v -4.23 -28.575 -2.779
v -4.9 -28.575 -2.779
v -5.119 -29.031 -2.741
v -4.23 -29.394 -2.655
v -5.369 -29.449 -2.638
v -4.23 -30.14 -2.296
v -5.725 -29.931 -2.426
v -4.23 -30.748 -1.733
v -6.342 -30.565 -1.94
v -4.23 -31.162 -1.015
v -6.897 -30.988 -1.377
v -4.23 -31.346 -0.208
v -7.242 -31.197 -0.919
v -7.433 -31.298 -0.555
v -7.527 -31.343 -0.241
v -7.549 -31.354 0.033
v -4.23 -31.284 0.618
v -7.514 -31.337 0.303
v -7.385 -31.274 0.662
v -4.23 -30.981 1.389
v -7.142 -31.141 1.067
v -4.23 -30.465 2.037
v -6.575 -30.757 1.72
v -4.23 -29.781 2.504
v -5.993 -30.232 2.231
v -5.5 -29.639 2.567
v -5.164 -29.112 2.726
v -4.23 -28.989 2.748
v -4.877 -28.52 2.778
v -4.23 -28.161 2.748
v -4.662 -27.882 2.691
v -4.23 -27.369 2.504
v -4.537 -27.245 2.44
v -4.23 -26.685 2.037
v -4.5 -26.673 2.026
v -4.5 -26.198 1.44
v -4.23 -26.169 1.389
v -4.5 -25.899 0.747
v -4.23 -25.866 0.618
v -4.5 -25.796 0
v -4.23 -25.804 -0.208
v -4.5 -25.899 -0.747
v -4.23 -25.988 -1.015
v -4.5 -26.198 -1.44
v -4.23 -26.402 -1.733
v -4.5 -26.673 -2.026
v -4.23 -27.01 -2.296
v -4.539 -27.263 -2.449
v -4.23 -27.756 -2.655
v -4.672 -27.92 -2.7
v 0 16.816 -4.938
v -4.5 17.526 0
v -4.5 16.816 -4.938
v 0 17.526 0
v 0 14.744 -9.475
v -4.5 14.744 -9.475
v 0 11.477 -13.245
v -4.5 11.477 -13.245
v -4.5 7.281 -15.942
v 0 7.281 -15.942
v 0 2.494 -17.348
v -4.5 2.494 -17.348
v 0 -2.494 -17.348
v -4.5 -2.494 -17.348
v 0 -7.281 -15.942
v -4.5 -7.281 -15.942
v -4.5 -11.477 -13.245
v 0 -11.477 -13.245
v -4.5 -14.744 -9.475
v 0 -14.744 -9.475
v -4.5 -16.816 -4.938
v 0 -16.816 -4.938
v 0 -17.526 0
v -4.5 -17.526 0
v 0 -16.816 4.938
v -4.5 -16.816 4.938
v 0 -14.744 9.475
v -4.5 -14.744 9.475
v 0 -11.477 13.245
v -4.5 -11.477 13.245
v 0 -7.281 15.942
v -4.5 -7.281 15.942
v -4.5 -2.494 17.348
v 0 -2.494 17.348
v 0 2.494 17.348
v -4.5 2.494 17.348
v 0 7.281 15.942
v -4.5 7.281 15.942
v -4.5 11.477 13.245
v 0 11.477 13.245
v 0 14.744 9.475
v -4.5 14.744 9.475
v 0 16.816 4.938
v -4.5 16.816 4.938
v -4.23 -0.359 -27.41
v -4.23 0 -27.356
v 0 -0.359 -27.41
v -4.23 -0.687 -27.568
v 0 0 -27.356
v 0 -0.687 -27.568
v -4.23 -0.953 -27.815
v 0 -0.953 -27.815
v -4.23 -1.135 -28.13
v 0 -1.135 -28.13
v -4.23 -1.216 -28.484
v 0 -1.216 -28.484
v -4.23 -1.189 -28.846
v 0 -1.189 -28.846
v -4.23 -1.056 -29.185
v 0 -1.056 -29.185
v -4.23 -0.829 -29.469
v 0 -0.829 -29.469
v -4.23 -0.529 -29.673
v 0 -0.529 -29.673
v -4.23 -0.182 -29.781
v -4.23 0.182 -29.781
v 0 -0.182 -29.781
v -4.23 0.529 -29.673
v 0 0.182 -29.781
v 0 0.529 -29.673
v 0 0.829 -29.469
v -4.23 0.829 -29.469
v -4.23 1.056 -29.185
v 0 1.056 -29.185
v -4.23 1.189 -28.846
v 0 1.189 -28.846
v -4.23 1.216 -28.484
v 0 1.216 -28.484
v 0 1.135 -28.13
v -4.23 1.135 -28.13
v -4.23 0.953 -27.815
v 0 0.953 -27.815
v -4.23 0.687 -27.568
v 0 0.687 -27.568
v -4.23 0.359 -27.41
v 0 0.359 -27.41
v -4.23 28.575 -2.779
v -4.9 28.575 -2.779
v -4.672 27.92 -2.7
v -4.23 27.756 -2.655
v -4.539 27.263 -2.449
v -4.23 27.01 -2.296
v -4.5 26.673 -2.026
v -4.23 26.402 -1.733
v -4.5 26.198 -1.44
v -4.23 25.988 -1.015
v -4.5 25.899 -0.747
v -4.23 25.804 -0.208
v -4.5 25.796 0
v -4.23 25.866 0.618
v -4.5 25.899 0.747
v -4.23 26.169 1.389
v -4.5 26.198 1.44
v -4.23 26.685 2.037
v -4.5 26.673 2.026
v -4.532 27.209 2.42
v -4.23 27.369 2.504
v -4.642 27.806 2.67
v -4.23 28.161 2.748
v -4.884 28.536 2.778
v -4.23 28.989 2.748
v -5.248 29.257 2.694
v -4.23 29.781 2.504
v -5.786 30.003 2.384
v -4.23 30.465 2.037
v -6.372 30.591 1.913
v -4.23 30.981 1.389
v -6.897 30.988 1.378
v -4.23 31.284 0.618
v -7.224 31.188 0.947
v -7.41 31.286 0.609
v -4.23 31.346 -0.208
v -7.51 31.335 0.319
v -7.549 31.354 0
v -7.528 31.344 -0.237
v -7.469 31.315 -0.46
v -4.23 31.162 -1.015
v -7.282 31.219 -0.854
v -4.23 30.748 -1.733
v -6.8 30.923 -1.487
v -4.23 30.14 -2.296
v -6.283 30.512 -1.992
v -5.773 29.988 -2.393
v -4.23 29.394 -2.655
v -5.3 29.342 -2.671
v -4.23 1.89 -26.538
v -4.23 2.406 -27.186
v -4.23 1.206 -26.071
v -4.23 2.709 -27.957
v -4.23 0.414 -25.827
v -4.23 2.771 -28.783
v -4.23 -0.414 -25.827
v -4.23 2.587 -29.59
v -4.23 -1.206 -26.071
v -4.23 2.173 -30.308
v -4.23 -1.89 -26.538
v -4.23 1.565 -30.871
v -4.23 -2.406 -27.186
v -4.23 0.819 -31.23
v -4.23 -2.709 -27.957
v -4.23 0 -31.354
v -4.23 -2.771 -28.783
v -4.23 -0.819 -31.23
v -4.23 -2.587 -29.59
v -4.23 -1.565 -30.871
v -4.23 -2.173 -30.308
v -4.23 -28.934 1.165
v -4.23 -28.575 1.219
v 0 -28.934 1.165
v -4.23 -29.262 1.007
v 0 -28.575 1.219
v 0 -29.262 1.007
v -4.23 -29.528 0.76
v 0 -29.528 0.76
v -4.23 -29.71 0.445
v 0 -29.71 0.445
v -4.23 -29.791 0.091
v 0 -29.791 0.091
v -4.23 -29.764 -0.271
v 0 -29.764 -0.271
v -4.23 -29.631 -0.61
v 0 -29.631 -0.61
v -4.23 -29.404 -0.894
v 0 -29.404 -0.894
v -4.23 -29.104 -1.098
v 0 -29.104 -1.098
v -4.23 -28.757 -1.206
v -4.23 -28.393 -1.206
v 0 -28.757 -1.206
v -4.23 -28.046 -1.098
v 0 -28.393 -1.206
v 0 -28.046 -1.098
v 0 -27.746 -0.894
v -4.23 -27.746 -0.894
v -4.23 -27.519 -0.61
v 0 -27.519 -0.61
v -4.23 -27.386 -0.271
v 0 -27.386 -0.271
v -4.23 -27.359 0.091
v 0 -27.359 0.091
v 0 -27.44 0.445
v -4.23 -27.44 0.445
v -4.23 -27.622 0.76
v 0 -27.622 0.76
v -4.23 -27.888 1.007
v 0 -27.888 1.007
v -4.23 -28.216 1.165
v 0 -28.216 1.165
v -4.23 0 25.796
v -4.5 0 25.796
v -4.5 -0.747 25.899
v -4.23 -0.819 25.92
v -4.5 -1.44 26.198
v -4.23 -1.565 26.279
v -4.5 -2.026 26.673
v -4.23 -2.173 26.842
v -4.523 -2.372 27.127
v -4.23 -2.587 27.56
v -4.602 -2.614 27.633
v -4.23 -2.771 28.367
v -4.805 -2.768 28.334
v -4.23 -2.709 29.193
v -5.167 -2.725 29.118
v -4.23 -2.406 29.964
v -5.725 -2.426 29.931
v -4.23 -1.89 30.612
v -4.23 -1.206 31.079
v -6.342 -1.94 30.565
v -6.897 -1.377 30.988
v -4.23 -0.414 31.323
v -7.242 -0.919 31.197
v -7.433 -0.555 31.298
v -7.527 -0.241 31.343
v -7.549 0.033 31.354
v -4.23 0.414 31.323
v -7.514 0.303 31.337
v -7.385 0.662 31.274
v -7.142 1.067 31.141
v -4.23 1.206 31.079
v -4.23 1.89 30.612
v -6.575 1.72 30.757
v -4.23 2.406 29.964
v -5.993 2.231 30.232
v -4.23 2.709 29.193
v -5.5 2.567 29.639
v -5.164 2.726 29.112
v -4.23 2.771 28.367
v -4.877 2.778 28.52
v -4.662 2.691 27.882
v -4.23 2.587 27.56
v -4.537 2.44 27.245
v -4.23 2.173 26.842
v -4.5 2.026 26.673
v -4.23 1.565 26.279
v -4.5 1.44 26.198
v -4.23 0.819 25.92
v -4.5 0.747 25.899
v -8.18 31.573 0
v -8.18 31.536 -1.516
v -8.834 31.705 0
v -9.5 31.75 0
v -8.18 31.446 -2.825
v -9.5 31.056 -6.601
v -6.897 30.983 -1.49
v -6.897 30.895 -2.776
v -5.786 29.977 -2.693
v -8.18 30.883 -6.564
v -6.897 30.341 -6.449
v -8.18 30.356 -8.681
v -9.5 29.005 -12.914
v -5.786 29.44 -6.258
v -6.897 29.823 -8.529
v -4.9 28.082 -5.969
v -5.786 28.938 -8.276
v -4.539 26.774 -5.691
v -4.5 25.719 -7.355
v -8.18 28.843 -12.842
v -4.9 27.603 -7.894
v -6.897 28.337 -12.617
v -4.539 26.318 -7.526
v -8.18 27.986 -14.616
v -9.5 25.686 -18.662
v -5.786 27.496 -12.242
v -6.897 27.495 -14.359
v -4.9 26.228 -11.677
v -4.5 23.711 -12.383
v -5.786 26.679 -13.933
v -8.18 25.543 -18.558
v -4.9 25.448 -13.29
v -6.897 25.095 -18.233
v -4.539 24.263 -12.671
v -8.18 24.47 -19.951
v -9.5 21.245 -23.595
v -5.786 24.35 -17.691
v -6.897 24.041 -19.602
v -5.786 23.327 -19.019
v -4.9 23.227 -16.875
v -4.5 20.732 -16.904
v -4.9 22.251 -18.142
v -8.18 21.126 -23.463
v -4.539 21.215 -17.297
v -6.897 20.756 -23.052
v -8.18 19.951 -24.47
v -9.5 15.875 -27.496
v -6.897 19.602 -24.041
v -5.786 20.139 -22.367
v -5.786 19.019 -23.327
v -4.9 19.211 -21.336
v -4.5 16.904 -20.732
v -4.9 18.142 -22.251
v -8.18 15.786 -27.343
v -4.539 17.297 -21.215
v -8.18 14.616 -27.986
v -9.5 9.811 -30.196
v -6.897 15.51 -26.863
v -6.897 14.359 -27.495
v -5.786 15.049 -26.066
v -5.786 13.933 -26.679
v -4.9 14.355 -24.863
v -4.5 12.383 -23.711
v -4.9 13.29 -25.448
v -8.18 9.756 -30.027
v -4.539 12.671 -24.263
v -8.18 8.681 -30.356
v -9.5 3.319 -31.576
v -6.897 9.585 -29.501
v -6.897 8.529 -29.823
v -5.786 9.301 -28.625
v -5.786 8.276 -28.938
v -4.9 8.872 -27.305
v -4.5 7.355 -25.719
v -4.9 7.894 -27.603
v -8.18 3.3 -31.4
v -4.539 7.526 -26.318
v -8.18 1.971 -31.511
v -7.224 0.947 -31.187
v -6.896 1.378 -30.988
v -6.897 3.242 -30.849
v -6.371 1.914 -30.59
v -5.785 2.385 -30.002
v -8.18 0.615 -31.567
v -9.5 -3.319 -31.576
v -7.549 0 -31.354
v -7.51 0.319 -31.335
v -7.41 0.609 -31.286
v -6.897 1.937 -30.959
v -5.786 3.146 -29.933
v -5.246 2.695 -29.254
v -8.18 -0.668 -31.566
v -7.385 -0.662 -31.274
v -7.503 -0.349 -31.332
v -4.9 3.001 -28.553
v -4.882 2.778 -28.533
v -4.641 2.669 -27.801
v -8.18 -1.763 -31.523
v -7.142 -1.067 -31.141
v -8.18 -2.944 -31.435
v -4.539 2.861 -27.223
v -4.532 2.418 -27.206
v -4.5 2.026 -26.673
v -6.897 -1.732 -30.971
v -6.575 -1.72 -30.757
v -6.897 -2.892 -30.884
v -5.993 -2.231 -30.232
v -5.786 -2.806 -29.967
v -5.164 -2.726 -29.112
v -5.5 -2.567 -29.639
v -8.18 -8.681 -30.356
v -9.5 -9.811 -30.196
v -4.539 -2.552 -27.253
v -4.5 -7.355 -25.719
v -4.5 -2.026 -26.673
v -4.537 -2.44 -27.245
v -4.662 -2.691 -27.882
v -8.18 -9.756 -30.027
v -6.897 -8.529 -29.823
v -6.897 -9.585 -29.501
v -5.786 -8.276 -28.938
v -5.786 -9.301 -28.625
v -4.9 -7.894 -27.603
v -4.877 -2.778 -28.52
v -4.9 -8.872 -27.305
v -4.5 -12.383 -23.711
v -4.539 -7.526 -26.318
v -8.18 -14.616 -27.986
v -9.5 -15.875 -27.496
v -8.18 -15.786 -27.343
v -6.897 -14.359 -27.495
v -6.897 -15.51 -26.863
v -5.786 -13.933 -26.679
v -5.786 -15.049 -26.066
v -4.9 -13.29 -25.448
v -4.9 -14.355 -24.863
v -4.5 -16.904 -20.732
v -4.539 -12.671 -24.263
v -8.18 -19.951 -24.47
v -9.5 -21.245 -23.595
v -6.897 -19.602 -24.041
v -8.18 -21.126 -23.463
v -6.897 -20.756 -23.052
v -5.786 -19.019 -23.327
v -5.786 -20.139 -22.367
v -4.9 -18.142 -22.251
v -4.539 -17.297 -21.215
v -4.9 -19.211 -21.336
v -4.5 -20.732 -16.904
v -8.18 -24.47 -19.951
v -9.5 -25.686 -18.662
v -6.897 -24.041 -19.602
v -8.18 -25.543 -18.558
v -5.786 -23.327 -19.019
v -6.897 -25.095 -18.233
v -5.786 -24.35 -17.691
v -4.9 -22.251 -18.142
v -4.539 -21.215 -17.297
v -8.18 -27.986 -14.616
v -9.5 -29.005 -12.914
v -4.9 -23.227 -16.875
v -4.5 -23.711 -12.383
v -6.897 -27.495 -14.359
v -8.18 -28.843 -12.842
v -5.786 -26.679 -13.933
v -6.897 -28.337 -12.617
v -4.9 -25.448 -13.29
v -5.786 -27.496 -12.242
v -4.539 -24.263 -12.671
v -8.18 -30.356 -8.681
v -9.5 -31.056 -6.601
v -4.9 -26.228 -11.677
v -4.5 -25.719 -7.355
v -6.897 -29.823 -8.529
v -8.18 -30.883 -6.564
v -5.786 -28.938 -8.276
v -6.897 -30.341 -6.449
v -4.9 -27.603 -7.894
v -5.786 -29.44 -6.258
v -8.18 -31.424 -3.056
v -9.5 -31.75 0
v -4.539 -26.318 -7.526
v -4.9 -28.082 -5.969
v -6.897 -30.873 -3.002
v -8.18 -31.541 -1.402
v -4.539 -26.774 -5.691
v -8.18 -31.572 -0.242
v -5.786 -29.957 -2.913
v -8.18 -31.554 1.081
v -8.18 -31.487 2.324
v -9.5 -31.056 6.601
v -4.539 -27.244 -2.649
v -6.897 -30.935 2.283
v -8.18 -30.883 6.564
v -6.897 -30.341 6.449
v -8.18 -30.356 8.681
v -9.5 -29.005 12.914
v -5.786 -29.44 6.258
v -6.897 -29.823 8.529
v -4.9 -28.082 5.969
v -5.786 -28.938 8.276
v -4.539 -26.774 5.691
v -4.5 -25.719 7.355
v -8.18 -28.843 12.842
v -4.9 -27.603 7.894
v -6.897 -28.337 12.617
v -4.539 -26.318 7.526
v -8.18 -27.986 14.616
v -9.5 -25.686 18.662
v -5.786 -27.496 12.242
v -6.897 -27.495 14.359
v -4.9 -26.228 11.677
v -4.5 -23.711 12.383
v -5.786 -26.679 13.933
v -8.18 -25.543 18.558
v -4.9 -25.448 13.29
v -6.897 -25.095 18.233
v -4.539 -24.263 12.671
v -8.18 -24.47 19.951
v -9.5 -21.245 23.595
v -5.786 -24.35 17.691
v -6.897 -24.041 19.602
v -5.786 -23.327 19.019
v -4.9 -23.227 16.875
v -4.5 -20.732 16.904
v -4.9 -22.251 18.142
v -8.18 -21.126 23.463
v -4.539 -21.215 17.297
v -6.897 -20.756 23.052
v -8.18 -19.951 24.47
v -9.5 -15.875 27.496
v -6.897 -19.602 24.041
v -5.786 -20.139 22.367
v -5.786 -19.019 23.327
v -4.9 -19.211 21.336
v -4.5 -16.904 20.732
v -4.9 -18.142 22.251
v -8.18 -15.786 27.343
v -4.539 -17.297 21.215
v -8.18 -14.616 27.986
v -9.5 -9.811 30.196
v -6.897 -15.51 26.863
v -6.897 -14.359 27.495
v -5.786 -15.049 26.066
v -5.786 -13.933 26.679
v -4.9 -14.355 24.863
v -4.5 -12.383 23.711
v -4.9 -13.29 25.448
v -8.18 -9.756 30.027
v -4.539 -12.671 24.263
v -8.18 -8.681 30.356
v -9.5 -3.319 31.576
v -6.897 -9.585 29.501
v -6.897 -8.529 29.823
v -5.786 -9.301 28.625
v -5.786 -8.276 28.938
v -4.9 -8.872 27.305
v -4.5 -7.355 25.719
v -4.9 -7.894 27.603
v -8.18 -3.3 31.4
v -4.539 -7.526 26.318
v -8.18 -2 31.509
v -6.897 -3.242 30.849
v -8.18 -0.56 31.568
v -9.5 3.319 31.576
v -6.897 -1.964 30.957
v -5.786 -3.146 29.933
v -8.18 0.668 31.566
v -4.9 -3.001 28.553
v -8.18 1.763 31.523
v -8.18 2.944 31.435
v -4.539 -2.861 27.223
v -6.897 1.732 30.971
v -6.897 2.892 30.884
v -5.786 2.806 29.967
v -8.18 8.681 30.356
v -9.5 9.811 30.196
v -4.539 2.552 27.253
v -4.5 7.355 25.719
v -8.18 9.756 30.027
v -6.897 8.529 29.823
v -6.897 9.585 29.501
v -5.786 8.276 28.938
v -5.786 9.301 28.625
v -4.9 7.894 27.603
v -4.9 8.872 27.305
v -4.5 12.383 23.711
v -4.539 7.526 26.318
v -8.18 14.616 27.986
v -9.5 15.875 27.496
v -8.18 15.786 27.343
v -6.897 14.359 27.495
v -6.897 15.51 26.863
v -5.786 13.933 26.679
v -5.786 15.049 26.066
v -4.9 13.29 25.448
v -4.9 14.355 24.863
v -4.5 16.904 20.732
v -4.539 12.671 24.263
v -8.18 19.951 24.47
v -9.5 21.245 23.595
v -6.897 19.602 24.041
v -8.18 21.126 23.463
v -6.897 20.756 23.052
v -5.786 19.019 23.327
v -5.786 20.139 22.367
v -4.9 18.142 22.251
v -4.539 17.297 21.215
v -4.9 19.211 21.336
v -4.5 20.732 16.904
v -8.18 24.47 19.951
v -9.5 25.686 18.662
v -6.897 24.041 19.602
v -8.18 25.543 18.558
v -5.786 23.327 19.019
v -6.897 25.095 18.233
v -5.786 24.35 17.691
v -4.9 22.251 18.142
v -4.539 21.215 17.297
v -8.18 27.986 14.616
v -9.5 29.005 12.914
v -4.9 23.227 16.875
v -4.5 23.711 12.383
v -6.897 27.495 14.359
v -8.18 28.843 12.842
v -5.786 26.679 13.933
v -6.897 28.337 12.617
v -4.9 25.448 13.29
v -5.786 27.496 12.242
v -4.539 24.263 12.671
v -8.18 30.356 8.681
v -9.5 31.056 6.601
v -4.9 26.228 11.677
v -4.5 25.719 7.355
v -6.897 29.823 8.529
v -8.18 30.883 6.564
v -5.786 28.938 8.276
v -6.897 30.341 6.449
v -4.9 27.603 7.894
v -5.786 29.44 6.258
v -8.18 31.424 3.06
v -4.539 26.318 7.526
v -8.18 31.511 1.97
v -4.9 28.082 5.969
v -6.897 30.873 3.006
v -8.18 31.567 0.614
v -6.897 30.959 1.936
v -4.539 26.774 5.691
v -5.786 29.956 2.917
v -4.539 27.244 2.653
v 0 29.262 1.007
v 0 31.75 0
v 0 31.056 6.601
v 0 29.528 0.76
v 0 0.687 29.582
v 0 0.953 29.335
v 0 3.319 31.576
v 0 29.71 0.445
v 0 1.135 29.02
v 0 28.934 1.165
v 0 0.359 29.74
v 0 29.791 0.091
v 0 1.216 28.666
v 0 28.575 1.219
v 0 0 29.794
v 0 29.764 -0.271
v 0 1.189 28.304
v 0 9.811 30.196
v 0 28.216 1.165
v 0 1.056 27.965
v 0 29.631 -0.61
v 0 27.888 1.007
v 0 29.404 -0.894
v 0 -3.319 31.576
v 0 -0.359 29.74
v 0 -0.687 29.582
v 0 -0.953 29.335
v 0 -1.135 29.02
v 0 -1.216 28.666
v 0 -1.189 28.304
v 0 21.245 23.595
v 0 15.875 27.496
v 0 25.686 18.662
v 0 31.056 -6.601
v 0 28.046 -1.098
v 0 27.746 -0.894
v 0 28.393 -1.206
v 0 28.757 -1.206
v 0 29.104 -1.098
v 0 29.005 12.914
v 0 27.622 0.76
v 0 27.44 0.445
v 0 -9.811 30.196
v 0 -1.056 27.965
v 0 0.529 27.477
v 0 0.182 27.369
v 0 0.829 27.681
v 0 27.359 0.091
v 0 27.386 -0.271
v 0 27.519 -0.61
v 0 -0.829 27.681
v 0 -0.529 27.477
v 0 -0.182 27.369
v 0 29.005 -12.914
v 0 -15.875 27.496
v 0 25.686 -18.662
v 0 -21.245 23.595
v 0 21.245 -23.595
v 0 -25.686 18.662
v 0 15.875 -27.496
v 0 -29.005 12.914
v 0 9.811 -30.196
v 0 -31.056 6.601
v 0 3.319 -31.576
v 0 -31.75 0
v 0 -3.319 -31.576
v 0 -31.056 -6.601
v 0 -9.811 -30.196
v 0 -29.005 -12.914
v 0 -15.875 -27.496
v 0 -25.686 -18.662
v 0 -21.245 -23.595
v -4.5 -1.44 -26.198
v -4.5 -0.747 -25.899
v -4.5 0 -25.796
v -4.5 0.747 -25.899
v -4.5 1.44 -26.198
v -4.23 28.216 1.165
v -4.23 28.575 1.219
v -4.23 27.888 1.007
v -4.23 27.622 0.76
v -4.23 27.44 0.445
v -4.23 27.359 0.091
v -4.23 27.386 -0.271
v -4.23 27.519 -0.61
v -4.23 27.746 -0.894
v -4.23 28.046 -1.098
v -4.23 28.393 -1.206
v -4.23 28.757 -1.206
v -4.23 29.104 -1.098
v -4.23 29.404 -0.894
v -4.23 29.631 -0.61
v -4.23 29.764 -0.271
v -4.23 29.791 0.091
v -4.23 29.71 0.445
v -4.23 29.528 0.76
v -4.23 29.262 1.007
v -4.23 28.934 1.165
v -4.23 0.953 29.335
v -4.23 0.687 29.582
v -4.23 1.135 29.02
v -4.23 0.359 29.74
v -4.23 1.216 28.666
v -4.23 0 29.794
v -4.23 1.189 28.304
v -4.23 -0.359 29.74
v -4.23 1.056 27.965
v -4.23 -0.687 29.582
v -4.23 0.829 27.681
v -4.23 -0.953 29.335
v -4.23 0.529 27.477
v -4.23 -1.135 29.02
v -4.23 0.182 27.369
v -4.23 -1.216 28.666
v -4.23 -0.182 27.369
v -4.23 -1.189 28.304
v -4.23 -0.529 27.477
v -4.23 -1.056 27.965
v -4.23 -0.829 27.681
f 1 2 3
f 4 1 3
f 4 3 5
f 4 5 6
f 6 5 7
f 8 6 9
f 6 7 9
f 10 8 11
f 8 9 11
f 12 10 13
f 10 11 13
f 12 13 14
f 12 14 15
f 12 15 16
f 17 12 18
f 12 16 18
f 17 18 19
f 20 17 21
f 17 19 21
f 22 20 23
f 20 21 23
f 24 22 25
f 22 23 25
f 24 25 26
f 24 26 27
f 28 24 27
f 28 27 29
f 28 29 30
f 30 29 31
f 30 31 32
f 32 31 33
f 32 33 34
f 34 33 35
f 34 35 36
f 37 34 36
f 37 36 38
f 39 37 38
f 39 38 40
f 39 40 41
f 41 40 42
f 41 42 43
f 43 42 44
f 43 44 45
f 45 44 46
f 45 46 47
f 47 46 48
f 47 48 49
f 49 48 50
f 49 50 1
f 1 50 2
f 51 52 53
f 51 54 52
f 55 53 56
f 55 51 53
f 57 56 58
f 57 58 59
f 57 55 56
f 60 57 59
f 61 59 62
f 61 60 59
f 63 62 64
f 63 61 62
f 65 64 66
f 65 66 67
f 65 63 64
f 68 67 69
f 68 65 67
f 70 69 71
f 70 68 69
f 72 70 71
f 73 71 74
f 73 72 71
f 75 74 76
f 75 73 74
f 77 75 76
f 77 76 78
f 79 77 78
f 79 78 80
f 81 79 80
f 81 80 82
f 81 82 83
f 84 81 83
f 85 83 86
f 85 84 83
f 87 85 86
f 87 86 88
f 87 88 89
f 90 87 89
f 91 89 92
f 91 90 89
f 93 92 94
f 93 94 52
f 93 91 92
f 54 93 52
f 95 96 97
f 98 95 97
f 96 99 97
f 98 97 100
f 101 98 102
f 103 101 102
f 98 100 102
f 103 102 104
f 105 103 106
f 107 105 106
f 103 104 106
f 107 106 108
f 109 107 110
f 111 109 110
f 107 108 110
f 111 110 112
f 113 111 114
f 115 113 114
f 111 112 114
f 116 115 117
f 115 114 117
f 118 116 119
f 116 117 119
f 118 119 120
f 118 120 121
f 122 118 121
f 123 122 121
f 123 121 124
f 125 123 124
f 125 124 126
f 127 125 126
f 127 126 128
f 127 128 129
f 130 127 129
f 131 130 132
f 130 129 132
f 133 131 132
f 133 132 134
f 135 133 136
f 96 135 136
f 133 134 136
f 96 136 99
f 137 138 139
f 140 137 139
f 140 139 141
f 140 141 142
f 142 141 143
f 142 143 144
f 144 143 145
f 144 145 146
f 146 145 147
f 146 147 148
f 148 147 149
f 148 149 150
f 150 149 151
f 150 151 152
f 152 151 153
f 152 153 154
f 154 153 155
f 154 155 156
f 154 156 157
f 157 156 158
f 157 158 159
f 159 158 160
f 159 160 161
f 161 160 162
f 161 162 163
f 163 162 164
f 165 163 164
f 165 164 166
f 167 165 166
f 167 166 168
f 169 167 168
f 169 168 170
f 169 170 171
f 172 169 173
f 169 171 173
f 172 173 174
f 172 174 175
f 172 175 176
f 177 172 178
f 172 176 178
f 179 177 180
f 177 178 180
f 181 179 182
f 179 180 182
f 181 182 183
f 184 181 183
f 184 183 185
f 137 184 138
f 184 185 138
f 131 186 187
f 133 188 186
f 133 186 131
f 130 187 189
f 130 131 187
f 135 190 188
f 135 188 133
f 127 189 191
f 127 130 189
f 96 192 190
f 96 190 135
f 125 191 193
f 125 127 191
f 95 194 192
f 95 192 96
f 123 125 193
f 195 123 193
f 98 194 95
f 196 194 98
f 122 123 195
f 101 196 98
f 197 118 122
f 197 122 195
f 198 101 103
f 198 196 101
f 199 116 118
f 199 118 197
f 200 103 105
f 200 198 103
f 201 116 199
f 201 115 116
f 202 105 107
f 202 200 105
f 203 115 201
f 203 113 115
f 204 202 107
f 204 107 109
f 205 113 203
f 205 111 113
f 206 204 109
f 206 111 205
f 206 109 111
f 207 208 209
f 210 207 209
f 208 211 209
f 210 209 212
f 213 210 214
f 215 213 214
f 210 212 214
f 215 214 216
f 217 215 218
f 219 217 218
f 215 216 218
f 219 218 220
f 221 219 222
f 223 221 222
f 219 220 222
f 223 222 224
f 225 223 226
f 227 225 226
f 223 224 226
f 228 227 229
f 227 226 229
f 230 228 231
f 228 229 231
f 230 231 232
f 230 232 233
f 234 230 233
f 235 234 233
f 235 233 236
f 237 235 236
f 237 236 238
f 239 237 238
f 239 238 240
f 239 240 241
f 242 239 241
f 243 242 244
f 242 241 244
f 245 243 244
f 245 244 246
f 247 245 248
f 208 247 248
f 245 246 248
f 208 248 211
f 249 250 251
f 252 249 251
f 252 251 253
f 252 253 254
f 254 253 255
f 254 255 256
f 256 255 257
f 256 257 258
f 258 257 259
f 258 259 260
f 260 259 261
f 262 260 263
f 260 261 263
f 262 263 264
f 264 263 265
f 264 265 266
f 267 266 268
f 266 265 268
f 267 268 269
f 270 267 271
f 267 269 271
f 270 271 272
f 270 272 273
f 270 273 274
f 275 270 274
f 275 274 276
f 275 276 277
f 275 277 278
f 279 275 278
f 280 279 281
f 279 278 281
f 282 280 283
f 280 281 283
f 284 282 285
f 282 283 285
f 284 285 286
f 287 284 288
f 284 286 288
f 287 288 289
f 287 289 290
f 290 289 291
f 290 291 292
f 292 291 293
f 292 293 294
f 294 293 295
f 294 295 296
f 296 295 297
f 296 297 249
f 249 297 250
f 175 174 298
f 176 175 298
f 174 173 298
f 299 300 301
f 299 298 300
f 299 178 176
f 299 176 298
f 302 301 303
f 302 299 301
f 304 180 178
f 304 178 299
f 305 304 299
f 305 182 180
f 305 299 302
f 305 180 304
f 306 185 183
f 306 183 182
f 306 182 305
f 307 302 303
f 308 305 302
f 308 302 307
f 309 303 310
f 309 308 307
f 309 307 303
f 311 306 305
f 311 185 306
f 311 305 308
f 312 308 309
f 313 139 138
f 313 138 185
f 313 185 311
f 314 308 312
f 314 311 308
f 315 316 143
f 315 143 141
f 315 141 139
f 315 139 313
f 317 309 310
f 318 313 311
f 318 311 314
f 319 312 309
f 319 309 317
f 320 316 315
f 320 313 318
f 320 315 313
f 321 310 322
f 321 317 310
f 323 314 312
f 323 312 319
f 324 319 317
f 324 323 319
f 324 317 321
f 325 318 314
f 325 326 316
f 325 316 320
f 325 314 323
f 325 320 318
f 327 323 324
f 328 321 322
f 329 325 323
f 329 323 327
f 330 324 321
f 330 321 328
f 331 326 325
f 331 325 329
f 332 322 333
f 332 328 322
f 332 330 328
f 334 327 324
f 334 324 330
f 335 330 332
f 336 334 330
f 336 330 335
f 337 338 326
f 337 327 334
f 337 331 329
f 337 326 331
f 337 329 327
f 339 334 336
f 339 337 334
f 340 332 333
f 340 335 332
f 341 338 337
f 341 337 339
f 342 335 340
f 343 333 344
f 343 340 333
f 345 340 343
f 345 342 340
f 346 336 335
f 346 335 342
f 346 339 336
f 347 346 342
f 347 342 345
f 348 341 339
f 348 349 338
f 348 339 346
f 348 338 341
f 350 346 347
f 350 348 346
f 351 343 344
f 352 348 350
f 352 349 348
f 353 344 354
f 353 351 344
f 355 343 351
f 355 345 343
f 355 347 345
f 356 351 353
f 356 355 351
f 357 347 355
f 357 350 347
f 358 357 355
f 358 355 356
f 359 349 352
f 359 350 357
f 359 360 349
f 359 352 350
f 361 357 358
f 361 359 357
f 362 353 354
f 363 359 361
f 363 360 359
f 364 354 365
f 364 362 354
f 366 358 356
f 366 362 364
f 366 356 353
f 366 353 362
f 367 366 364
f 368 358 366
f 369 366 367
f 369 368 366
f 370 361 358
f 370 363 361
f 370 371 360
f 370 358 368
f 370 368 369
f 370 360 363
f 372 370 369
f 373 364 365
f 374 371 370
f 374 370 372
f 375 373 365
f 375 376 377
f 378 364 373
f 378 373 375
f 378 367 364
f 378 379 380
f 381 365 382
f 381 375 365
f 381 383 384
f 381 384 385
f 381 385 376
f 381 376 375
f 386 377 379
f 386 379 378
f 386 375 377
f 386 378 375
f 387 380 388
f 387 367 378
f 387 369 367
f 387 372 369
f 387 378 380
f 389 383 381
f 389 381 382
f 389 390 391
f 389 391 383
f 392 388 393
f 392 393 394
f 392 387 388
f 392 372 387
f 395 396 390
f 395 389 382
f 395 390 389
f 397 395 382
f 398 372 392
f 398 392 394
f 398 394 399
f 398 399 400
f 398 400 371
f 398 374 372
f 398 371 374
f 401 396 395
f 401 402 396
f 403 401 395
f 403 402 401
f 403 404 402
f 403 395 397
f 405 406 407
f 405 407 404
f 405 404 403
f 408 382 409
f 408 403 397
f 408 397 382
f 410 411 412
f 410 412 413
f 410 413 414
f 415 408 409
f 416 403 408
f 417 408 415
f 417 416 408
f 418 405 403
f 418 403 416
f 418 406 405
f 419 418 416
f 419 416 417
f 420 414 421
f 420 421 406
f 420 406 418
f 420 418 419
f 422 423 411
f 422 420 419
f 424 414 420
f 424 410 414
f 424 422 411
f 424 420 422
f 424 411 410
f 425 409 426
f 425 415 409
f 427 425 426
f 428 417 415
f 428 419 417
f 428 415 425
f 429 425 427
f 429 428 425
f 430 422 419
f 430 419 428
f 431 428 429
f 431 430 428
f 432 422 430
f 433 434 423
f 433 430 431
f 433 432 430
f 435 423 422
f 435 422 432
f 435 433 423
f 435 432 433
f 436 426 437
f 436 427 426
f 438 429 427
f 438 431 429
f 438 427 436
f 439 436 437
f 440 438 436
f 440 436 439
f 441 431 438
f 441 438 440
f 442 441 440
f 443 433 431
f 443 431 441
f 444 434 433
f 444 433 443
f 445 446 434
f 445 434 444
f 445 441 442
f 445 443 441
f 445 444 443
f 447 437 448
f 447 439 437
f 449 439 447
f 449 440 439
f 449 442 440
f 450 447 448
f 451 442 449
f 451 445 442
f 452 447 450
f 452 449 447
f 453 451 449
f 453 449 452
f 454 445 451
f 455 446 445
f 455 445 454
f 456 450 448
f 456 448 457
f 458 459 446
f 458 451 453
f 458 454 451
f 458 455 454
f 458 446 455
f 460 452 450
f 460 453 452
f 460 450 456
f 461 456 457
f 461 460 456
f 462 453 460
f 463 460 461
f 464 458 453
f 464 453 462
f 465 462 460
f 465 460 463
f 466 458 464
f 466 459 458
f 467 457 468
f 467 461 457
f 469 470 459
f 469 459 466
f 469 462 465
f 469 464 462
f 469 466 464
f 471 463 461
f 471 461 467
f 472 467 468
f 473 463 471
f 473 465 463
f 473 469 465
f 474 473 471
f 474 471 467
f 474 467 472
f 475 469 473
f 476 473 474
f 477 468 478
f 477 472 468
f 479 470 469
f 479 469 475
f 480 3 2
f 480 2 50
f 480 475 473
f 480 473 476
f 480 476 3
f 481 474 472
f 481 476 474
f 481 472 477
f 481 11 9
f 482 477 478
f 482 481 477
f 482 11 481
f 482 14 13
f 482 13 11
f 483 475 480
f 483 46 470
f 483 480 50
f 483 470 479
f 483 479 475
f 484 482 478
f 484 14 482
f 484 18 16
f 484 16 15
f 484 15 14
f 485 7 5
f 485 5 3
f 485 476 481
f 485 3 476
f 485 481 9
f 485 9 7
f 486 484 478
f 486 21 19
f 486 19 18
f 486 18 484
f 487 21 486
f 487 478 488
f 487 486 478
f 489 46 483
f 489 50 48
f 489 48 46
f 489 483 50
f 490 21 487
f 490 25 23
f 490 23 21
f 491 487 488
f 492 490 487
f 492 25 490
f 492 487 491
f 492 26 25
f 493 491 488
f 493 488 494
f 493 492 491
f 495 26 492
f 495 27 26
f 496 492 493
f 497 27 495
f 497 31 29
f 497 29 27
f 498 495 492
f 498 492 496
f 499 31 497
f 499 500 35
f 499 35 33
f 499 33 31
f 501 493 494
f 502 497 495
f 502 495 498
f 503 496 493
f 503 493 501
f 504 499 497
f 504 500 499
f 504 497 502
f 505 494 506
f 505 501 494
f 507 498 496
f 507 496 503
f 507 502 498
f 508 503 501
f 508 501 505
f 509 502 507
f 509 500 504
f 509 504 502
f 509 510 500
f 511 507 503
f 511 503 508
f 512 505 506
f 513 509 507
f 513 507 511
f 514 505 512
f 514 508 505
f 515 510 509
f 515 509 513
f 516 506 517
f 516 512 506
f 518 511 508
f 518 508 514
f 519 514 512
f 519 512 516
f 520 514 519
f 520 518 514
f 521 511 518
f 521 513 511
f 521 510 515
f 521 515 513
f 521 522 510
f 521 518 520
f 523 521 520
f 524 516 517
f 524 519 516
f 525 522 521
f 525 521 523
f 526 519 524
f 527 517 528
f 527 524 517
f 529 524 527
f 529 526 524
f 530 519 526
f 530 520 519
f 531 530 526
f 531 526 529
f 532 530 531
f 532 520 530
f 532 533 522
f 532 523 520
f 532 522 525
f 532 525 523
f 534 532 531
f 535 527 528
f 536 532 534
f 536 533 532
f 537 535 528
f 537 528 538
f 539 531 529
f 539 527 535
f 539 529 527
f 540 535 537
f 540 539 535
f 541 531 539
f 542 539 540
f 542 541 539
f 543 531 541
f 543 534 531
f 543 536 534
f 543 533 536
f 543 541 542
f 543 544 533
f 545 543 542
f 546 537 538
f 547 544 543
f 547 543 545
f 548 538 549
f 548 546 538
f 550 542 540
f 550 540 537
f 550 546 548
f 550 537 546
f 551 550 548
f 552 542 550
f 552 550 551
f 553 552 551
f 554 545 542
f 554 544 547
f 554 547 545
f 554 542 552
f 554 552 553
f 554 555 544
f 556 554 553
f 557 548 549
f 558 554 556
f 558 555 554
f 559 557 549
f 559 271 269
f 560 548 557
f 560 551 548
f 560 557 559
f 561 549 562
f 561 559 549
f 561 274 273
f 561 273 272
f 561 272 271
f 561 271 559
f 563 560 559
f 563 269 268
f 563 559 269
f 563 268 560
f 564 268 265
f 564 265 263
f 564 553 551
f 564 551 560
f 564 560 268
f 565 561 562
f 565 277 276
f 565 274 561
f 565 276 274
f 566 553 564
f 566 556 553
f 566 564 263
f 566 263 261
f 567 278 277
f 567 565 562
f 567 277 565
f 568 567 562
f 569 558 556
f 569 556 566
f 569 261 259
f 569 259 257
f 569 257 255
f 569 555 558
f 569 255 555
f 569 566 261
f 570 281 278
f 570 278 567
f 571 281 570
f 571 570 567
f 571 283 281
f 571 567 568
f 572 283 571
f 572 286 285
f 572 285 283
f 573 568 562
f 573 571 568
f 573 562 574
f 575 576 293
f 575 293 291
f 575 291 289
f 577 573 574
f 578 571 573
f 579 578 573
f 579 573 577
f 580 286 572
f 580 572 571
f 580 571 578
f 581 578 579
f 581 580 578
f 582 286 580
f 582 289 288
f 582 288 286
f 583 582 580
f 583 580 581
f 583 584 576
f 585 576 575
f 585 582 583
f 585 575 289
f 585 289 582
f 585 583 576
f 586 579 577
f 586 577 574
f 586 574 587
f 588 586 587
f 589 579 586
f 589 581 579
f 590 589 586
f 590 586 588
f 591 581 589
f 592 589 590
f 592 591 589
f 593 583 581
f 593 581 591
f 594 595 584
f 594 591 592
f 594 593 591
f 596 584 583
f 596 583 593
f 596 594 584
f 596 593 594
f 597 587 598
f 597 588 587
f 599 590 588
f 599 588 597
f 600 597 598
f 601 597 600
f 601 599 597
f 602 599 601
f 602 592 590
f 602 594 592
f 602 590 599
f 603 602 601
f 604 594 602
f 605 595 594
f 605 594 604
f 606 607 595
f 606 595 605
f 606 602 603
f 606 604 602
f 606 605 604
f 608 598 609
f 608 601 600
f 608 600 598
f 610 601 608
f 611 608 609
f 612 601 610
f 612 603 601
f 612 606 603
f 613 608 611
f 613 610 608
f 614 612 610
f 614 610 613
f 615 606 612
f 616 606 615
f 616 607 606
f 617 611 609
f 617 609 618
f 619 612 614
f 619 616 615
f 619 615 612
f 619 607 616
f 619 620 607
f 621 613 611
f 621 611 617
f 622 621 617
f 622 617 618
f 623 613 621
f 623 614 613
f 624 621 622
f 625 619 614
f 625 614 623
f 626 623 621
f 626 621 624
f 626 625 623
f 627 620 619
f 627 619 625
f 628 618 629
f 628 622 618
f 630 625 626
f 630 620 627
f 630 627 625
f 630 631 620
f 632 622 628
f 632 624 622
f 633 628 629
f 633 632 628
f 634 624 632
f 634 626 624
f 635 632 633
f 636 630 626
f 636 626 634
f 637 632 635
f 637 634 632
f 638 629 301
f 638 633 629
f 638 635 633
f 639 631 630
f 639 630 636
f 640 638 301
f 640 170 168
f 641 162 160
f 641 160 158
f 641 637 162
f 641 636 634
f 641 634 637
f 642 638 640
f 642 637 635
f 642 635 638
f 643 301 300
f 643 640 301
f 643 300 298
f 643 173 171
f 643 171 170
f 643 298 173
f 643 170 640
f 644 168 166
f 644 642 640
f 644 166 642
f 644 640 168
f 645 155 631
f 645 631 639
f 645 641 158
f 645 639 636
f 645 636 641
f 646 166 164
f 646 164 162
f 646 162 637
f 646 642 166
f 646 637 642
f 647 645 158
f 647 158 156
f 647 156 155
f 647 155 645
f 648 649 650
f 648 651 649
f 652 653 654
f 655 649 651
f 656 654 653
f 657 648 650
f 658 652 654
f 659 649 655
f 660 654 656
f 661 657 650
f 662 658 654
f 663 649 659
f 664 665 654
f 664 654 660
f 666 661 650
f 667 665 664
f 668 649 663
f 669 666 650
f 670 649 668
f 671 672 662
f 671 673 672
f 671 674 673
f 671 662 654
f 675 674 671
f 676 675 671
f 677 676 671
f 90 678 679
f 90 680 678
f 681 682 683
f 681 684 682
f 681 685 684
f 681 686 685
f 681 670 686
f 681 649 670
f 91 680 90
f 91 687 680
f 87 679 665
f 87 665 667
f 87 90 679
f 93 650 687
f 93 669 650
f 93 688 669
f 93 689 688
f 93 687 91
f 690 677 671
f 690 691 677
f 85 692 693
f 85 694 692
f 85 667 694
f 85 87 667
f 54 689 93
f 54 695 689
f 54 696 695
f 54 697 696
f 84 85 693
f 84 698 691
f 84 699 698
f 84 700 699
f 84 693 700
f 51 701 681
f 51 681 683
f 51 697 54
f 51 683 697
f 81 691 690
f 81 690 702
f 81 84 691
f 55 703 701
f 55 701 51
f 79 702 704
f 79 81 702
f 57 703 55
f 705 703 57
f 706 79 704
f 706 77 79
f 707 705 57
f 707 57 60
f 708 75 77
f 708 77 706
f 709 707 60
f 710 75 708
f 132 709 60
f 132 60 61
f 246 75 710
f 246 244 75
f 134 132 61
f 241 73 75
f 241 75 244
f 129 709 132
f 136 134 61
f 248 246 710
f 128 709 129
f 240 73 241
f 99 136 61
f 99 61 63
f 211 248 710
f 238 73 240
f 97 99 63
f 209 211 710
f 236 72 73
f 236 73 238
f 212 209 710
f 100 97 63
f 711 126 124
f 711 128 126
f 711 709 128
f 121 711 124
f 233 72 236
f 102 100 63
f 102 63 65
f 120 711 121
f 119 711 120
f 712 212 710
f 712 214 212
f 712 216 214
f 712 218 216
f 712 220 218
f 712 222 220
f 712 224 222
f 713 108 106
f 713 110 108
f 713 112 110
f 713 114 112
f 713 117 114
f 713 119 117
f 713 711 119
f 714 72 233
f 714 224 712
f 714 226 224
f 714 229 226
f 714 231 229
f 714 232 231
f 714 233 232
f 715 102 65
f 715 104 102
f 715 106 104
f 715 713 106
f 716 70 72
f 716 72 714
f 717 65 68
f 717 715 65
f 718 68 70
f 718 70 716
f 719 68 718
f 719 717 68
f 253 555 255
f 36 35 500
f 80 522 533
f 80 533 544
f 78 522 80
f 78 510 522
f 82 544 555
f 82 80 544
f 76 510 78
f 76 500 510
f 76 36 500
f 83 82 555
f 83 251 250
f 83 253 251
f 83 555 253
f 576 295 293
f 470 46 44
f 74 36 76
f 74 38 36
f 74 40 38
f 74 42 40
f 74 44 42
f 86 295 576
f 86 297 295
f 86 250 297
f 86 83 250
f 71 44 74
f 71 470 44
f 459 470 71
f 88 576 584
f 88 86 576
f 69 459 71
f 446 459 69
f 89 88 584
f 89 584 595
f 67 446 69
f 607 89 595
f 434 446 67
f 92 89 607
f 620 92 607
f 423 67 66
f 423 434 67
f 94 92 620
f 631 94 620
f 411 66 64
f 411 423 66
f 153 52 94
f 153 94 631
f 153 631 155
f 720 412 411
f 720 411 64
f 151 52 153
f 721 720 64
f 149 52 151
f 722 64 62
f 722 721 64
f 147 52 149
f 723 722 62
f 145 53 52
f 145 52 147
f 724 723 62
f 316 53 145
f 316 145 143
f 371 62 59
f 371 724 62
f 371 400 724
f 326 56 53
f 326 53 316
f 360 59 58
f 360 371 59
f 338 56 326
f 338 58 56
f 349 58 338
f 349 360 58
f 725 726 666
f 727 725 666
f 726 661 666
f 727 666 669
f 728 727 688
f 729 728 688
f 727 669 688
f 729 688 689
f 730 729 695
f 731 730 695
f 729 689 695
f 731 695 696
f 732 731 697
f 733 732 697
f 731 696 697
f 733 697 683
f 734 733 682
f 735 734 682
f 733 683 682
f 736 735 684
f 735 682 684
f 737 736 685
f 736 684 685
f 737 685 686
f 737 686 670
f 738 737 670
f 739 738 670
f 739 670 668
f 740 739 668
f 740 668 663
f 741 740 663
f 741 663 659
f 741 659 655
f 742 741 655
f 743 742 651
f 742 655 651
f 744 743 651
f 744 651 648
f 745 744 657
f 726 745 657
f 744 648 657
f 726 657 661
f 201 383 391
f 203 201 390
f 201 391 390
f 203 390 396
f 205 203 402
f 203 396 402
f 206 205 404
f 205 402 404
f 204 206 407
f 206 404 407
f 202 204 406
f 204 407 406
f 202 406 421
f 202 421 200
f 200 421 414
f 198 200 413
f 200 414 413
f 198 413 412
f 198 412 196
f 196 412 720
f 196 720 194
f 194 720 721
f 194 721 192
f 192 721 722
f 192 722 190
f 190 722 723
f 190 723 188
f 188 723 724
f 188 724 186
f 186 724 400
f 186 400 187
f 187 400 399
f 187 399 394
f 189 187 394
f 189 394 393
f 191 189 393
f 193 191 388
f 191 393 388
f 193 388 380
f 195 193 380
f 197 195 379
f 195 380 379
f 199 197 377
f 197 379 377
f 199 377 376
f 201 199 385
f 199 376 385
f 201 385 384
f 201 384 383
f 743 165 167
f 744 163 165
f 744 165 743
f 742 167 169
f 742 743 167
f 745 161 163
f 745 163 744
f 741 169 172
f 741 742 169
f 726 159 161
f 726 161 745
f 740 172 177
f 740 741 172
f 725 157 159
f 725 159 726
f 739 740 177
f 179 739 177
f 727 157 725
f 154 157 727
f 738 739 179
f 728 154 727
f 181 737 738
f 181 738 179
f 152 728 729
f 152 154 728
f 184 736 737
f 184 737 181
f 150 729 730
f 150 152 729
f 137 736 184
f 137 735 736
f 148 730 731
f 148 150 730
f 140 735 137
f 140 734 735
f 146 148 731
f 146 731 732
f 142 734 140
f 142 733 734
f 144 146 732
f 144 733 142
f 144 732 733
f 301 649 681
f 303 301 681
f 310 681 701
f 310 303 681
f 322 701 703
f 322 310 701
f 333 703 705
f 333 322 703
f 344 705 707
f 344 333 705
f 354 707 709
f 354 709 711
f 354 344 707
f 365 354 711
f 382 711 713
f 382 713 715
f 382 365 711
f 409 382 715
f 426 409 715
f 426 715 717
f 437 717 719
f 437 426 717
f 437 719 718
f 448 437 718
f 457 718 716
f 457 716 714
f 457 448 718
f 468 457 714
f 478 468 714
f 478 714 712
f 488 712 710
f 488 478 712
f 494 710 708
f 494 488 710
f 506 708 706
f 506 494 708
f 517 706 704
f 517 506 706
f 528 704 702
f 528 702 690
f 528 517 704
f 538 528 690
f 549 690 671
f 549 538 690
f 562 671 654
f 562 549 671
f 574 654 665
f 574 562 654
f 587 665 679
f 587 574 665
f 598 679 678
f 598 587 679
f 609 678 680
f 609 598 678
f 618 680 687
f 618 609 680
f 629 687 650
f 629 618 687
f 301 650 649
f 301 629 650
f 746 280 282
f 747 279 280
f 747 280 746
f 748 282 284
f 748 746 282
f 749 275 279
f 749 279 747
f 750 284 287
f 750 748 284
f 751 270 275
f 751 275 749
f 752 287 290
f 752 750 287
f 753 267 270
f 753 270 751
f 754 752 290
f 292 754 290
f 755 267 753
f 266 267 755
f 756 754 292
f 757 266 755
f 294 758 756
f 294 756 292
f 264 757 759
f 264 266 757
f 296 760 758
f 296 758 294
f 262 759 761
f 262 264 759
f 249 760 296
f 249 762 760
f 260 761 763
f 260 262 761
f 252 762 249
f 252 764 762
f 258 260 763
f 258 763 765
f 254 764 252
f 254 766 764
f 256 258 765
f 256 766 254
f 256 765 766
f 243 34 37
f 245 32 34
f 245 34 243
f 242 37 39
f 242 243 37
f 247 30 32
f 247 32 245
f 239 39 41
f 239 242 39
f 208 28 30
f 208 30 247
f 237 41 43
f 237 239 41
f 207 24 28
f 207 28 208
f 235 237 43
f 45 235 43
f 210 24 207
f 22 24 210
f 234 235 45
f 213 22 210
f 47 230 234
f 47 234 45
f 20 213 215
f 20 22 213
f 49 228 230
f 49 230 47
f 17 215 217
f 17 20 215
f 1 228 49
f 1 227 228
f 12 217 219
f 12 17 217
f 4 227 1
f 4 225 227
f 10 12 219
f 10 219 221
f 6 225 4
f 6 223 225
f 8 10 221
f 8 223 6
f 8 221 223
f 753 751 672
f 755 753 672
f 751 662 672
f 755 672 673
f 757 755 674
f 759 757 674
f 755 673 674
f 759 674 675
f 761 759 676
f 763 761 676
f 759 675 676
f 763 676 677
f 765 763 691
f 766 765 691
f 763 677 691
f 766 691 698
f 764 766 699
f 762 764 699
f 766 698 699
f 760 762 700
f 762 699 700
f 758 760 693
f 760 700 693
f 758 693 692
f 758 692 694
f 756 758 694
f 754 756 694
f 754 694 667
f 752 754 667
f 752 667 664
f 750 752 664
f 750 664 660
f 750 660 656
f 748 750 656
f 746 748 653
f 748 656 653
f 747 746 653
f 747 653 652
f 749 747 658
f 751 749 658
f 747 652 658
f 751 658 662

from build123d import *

# Parameters (mm, degrees)
CBORE_FOR_2_BINDING_HEAD_MACHINE_SCREW1_D           = 2.4384
CBORE_FOR_2_BINDING_HEAD_MACHINE_SCREW1_CBORE_D     = 5.55752
CBORE_FOR_2_BINDING_HEAD_MACHINE_SCREW1_CBORE_DEPTH = 5.269992


with BuildPart() as part:
    # Sketch13 → Revolve1 (revolve)
    with BuildSketch(Plane.XY, mode=Mode.PRIVATE) as revolve1_sk:
        with BuildLine():
            Line((0, -31.75), (-9.5, -31.75))
            ThreePointArc((-9.5, -31.75), (-5.964466094, -30.285533906), (-4.5, -26.75))
            Line((-4.5, -26.75), (-4.5, -17.526))
            Line((-4.5, -17.526), (0, -17.526))
            Line((0, -17.526), (0, -31.75))
        make_face()
    revolve(revolve1_sk.sketch.rotate(Axis((16.880780842, 0, 0), (-1, 0, 0)), 180), axis=Axis((16.880780842, 0, 0), (-1, 0, 0)))

    # CBORE for #2 Binding Head Machine Screw1 (through all)
    with Locations(Plane(origin=(-9.5, 0, 0), x_dir=(0, 0, -1), z_dir=(-1, 0, 0))):
        with Locations((-28.575, 0), (0, -28.575), (28.575, 0), (0, 28.575)):
            CounterBoreHole(CBORE_FOR_2_BINDING_HEAD_MACHINE_SCREW1_D / 2, CBORE_FOR_2_BINDING_HEAD_MACHINE_SCREW1_CBORE_D / 2, CBORE_FOR_2_BINDING_HEAD_MACHINE_SCREW1_CBORE_DEPTH)


solid = part.part
